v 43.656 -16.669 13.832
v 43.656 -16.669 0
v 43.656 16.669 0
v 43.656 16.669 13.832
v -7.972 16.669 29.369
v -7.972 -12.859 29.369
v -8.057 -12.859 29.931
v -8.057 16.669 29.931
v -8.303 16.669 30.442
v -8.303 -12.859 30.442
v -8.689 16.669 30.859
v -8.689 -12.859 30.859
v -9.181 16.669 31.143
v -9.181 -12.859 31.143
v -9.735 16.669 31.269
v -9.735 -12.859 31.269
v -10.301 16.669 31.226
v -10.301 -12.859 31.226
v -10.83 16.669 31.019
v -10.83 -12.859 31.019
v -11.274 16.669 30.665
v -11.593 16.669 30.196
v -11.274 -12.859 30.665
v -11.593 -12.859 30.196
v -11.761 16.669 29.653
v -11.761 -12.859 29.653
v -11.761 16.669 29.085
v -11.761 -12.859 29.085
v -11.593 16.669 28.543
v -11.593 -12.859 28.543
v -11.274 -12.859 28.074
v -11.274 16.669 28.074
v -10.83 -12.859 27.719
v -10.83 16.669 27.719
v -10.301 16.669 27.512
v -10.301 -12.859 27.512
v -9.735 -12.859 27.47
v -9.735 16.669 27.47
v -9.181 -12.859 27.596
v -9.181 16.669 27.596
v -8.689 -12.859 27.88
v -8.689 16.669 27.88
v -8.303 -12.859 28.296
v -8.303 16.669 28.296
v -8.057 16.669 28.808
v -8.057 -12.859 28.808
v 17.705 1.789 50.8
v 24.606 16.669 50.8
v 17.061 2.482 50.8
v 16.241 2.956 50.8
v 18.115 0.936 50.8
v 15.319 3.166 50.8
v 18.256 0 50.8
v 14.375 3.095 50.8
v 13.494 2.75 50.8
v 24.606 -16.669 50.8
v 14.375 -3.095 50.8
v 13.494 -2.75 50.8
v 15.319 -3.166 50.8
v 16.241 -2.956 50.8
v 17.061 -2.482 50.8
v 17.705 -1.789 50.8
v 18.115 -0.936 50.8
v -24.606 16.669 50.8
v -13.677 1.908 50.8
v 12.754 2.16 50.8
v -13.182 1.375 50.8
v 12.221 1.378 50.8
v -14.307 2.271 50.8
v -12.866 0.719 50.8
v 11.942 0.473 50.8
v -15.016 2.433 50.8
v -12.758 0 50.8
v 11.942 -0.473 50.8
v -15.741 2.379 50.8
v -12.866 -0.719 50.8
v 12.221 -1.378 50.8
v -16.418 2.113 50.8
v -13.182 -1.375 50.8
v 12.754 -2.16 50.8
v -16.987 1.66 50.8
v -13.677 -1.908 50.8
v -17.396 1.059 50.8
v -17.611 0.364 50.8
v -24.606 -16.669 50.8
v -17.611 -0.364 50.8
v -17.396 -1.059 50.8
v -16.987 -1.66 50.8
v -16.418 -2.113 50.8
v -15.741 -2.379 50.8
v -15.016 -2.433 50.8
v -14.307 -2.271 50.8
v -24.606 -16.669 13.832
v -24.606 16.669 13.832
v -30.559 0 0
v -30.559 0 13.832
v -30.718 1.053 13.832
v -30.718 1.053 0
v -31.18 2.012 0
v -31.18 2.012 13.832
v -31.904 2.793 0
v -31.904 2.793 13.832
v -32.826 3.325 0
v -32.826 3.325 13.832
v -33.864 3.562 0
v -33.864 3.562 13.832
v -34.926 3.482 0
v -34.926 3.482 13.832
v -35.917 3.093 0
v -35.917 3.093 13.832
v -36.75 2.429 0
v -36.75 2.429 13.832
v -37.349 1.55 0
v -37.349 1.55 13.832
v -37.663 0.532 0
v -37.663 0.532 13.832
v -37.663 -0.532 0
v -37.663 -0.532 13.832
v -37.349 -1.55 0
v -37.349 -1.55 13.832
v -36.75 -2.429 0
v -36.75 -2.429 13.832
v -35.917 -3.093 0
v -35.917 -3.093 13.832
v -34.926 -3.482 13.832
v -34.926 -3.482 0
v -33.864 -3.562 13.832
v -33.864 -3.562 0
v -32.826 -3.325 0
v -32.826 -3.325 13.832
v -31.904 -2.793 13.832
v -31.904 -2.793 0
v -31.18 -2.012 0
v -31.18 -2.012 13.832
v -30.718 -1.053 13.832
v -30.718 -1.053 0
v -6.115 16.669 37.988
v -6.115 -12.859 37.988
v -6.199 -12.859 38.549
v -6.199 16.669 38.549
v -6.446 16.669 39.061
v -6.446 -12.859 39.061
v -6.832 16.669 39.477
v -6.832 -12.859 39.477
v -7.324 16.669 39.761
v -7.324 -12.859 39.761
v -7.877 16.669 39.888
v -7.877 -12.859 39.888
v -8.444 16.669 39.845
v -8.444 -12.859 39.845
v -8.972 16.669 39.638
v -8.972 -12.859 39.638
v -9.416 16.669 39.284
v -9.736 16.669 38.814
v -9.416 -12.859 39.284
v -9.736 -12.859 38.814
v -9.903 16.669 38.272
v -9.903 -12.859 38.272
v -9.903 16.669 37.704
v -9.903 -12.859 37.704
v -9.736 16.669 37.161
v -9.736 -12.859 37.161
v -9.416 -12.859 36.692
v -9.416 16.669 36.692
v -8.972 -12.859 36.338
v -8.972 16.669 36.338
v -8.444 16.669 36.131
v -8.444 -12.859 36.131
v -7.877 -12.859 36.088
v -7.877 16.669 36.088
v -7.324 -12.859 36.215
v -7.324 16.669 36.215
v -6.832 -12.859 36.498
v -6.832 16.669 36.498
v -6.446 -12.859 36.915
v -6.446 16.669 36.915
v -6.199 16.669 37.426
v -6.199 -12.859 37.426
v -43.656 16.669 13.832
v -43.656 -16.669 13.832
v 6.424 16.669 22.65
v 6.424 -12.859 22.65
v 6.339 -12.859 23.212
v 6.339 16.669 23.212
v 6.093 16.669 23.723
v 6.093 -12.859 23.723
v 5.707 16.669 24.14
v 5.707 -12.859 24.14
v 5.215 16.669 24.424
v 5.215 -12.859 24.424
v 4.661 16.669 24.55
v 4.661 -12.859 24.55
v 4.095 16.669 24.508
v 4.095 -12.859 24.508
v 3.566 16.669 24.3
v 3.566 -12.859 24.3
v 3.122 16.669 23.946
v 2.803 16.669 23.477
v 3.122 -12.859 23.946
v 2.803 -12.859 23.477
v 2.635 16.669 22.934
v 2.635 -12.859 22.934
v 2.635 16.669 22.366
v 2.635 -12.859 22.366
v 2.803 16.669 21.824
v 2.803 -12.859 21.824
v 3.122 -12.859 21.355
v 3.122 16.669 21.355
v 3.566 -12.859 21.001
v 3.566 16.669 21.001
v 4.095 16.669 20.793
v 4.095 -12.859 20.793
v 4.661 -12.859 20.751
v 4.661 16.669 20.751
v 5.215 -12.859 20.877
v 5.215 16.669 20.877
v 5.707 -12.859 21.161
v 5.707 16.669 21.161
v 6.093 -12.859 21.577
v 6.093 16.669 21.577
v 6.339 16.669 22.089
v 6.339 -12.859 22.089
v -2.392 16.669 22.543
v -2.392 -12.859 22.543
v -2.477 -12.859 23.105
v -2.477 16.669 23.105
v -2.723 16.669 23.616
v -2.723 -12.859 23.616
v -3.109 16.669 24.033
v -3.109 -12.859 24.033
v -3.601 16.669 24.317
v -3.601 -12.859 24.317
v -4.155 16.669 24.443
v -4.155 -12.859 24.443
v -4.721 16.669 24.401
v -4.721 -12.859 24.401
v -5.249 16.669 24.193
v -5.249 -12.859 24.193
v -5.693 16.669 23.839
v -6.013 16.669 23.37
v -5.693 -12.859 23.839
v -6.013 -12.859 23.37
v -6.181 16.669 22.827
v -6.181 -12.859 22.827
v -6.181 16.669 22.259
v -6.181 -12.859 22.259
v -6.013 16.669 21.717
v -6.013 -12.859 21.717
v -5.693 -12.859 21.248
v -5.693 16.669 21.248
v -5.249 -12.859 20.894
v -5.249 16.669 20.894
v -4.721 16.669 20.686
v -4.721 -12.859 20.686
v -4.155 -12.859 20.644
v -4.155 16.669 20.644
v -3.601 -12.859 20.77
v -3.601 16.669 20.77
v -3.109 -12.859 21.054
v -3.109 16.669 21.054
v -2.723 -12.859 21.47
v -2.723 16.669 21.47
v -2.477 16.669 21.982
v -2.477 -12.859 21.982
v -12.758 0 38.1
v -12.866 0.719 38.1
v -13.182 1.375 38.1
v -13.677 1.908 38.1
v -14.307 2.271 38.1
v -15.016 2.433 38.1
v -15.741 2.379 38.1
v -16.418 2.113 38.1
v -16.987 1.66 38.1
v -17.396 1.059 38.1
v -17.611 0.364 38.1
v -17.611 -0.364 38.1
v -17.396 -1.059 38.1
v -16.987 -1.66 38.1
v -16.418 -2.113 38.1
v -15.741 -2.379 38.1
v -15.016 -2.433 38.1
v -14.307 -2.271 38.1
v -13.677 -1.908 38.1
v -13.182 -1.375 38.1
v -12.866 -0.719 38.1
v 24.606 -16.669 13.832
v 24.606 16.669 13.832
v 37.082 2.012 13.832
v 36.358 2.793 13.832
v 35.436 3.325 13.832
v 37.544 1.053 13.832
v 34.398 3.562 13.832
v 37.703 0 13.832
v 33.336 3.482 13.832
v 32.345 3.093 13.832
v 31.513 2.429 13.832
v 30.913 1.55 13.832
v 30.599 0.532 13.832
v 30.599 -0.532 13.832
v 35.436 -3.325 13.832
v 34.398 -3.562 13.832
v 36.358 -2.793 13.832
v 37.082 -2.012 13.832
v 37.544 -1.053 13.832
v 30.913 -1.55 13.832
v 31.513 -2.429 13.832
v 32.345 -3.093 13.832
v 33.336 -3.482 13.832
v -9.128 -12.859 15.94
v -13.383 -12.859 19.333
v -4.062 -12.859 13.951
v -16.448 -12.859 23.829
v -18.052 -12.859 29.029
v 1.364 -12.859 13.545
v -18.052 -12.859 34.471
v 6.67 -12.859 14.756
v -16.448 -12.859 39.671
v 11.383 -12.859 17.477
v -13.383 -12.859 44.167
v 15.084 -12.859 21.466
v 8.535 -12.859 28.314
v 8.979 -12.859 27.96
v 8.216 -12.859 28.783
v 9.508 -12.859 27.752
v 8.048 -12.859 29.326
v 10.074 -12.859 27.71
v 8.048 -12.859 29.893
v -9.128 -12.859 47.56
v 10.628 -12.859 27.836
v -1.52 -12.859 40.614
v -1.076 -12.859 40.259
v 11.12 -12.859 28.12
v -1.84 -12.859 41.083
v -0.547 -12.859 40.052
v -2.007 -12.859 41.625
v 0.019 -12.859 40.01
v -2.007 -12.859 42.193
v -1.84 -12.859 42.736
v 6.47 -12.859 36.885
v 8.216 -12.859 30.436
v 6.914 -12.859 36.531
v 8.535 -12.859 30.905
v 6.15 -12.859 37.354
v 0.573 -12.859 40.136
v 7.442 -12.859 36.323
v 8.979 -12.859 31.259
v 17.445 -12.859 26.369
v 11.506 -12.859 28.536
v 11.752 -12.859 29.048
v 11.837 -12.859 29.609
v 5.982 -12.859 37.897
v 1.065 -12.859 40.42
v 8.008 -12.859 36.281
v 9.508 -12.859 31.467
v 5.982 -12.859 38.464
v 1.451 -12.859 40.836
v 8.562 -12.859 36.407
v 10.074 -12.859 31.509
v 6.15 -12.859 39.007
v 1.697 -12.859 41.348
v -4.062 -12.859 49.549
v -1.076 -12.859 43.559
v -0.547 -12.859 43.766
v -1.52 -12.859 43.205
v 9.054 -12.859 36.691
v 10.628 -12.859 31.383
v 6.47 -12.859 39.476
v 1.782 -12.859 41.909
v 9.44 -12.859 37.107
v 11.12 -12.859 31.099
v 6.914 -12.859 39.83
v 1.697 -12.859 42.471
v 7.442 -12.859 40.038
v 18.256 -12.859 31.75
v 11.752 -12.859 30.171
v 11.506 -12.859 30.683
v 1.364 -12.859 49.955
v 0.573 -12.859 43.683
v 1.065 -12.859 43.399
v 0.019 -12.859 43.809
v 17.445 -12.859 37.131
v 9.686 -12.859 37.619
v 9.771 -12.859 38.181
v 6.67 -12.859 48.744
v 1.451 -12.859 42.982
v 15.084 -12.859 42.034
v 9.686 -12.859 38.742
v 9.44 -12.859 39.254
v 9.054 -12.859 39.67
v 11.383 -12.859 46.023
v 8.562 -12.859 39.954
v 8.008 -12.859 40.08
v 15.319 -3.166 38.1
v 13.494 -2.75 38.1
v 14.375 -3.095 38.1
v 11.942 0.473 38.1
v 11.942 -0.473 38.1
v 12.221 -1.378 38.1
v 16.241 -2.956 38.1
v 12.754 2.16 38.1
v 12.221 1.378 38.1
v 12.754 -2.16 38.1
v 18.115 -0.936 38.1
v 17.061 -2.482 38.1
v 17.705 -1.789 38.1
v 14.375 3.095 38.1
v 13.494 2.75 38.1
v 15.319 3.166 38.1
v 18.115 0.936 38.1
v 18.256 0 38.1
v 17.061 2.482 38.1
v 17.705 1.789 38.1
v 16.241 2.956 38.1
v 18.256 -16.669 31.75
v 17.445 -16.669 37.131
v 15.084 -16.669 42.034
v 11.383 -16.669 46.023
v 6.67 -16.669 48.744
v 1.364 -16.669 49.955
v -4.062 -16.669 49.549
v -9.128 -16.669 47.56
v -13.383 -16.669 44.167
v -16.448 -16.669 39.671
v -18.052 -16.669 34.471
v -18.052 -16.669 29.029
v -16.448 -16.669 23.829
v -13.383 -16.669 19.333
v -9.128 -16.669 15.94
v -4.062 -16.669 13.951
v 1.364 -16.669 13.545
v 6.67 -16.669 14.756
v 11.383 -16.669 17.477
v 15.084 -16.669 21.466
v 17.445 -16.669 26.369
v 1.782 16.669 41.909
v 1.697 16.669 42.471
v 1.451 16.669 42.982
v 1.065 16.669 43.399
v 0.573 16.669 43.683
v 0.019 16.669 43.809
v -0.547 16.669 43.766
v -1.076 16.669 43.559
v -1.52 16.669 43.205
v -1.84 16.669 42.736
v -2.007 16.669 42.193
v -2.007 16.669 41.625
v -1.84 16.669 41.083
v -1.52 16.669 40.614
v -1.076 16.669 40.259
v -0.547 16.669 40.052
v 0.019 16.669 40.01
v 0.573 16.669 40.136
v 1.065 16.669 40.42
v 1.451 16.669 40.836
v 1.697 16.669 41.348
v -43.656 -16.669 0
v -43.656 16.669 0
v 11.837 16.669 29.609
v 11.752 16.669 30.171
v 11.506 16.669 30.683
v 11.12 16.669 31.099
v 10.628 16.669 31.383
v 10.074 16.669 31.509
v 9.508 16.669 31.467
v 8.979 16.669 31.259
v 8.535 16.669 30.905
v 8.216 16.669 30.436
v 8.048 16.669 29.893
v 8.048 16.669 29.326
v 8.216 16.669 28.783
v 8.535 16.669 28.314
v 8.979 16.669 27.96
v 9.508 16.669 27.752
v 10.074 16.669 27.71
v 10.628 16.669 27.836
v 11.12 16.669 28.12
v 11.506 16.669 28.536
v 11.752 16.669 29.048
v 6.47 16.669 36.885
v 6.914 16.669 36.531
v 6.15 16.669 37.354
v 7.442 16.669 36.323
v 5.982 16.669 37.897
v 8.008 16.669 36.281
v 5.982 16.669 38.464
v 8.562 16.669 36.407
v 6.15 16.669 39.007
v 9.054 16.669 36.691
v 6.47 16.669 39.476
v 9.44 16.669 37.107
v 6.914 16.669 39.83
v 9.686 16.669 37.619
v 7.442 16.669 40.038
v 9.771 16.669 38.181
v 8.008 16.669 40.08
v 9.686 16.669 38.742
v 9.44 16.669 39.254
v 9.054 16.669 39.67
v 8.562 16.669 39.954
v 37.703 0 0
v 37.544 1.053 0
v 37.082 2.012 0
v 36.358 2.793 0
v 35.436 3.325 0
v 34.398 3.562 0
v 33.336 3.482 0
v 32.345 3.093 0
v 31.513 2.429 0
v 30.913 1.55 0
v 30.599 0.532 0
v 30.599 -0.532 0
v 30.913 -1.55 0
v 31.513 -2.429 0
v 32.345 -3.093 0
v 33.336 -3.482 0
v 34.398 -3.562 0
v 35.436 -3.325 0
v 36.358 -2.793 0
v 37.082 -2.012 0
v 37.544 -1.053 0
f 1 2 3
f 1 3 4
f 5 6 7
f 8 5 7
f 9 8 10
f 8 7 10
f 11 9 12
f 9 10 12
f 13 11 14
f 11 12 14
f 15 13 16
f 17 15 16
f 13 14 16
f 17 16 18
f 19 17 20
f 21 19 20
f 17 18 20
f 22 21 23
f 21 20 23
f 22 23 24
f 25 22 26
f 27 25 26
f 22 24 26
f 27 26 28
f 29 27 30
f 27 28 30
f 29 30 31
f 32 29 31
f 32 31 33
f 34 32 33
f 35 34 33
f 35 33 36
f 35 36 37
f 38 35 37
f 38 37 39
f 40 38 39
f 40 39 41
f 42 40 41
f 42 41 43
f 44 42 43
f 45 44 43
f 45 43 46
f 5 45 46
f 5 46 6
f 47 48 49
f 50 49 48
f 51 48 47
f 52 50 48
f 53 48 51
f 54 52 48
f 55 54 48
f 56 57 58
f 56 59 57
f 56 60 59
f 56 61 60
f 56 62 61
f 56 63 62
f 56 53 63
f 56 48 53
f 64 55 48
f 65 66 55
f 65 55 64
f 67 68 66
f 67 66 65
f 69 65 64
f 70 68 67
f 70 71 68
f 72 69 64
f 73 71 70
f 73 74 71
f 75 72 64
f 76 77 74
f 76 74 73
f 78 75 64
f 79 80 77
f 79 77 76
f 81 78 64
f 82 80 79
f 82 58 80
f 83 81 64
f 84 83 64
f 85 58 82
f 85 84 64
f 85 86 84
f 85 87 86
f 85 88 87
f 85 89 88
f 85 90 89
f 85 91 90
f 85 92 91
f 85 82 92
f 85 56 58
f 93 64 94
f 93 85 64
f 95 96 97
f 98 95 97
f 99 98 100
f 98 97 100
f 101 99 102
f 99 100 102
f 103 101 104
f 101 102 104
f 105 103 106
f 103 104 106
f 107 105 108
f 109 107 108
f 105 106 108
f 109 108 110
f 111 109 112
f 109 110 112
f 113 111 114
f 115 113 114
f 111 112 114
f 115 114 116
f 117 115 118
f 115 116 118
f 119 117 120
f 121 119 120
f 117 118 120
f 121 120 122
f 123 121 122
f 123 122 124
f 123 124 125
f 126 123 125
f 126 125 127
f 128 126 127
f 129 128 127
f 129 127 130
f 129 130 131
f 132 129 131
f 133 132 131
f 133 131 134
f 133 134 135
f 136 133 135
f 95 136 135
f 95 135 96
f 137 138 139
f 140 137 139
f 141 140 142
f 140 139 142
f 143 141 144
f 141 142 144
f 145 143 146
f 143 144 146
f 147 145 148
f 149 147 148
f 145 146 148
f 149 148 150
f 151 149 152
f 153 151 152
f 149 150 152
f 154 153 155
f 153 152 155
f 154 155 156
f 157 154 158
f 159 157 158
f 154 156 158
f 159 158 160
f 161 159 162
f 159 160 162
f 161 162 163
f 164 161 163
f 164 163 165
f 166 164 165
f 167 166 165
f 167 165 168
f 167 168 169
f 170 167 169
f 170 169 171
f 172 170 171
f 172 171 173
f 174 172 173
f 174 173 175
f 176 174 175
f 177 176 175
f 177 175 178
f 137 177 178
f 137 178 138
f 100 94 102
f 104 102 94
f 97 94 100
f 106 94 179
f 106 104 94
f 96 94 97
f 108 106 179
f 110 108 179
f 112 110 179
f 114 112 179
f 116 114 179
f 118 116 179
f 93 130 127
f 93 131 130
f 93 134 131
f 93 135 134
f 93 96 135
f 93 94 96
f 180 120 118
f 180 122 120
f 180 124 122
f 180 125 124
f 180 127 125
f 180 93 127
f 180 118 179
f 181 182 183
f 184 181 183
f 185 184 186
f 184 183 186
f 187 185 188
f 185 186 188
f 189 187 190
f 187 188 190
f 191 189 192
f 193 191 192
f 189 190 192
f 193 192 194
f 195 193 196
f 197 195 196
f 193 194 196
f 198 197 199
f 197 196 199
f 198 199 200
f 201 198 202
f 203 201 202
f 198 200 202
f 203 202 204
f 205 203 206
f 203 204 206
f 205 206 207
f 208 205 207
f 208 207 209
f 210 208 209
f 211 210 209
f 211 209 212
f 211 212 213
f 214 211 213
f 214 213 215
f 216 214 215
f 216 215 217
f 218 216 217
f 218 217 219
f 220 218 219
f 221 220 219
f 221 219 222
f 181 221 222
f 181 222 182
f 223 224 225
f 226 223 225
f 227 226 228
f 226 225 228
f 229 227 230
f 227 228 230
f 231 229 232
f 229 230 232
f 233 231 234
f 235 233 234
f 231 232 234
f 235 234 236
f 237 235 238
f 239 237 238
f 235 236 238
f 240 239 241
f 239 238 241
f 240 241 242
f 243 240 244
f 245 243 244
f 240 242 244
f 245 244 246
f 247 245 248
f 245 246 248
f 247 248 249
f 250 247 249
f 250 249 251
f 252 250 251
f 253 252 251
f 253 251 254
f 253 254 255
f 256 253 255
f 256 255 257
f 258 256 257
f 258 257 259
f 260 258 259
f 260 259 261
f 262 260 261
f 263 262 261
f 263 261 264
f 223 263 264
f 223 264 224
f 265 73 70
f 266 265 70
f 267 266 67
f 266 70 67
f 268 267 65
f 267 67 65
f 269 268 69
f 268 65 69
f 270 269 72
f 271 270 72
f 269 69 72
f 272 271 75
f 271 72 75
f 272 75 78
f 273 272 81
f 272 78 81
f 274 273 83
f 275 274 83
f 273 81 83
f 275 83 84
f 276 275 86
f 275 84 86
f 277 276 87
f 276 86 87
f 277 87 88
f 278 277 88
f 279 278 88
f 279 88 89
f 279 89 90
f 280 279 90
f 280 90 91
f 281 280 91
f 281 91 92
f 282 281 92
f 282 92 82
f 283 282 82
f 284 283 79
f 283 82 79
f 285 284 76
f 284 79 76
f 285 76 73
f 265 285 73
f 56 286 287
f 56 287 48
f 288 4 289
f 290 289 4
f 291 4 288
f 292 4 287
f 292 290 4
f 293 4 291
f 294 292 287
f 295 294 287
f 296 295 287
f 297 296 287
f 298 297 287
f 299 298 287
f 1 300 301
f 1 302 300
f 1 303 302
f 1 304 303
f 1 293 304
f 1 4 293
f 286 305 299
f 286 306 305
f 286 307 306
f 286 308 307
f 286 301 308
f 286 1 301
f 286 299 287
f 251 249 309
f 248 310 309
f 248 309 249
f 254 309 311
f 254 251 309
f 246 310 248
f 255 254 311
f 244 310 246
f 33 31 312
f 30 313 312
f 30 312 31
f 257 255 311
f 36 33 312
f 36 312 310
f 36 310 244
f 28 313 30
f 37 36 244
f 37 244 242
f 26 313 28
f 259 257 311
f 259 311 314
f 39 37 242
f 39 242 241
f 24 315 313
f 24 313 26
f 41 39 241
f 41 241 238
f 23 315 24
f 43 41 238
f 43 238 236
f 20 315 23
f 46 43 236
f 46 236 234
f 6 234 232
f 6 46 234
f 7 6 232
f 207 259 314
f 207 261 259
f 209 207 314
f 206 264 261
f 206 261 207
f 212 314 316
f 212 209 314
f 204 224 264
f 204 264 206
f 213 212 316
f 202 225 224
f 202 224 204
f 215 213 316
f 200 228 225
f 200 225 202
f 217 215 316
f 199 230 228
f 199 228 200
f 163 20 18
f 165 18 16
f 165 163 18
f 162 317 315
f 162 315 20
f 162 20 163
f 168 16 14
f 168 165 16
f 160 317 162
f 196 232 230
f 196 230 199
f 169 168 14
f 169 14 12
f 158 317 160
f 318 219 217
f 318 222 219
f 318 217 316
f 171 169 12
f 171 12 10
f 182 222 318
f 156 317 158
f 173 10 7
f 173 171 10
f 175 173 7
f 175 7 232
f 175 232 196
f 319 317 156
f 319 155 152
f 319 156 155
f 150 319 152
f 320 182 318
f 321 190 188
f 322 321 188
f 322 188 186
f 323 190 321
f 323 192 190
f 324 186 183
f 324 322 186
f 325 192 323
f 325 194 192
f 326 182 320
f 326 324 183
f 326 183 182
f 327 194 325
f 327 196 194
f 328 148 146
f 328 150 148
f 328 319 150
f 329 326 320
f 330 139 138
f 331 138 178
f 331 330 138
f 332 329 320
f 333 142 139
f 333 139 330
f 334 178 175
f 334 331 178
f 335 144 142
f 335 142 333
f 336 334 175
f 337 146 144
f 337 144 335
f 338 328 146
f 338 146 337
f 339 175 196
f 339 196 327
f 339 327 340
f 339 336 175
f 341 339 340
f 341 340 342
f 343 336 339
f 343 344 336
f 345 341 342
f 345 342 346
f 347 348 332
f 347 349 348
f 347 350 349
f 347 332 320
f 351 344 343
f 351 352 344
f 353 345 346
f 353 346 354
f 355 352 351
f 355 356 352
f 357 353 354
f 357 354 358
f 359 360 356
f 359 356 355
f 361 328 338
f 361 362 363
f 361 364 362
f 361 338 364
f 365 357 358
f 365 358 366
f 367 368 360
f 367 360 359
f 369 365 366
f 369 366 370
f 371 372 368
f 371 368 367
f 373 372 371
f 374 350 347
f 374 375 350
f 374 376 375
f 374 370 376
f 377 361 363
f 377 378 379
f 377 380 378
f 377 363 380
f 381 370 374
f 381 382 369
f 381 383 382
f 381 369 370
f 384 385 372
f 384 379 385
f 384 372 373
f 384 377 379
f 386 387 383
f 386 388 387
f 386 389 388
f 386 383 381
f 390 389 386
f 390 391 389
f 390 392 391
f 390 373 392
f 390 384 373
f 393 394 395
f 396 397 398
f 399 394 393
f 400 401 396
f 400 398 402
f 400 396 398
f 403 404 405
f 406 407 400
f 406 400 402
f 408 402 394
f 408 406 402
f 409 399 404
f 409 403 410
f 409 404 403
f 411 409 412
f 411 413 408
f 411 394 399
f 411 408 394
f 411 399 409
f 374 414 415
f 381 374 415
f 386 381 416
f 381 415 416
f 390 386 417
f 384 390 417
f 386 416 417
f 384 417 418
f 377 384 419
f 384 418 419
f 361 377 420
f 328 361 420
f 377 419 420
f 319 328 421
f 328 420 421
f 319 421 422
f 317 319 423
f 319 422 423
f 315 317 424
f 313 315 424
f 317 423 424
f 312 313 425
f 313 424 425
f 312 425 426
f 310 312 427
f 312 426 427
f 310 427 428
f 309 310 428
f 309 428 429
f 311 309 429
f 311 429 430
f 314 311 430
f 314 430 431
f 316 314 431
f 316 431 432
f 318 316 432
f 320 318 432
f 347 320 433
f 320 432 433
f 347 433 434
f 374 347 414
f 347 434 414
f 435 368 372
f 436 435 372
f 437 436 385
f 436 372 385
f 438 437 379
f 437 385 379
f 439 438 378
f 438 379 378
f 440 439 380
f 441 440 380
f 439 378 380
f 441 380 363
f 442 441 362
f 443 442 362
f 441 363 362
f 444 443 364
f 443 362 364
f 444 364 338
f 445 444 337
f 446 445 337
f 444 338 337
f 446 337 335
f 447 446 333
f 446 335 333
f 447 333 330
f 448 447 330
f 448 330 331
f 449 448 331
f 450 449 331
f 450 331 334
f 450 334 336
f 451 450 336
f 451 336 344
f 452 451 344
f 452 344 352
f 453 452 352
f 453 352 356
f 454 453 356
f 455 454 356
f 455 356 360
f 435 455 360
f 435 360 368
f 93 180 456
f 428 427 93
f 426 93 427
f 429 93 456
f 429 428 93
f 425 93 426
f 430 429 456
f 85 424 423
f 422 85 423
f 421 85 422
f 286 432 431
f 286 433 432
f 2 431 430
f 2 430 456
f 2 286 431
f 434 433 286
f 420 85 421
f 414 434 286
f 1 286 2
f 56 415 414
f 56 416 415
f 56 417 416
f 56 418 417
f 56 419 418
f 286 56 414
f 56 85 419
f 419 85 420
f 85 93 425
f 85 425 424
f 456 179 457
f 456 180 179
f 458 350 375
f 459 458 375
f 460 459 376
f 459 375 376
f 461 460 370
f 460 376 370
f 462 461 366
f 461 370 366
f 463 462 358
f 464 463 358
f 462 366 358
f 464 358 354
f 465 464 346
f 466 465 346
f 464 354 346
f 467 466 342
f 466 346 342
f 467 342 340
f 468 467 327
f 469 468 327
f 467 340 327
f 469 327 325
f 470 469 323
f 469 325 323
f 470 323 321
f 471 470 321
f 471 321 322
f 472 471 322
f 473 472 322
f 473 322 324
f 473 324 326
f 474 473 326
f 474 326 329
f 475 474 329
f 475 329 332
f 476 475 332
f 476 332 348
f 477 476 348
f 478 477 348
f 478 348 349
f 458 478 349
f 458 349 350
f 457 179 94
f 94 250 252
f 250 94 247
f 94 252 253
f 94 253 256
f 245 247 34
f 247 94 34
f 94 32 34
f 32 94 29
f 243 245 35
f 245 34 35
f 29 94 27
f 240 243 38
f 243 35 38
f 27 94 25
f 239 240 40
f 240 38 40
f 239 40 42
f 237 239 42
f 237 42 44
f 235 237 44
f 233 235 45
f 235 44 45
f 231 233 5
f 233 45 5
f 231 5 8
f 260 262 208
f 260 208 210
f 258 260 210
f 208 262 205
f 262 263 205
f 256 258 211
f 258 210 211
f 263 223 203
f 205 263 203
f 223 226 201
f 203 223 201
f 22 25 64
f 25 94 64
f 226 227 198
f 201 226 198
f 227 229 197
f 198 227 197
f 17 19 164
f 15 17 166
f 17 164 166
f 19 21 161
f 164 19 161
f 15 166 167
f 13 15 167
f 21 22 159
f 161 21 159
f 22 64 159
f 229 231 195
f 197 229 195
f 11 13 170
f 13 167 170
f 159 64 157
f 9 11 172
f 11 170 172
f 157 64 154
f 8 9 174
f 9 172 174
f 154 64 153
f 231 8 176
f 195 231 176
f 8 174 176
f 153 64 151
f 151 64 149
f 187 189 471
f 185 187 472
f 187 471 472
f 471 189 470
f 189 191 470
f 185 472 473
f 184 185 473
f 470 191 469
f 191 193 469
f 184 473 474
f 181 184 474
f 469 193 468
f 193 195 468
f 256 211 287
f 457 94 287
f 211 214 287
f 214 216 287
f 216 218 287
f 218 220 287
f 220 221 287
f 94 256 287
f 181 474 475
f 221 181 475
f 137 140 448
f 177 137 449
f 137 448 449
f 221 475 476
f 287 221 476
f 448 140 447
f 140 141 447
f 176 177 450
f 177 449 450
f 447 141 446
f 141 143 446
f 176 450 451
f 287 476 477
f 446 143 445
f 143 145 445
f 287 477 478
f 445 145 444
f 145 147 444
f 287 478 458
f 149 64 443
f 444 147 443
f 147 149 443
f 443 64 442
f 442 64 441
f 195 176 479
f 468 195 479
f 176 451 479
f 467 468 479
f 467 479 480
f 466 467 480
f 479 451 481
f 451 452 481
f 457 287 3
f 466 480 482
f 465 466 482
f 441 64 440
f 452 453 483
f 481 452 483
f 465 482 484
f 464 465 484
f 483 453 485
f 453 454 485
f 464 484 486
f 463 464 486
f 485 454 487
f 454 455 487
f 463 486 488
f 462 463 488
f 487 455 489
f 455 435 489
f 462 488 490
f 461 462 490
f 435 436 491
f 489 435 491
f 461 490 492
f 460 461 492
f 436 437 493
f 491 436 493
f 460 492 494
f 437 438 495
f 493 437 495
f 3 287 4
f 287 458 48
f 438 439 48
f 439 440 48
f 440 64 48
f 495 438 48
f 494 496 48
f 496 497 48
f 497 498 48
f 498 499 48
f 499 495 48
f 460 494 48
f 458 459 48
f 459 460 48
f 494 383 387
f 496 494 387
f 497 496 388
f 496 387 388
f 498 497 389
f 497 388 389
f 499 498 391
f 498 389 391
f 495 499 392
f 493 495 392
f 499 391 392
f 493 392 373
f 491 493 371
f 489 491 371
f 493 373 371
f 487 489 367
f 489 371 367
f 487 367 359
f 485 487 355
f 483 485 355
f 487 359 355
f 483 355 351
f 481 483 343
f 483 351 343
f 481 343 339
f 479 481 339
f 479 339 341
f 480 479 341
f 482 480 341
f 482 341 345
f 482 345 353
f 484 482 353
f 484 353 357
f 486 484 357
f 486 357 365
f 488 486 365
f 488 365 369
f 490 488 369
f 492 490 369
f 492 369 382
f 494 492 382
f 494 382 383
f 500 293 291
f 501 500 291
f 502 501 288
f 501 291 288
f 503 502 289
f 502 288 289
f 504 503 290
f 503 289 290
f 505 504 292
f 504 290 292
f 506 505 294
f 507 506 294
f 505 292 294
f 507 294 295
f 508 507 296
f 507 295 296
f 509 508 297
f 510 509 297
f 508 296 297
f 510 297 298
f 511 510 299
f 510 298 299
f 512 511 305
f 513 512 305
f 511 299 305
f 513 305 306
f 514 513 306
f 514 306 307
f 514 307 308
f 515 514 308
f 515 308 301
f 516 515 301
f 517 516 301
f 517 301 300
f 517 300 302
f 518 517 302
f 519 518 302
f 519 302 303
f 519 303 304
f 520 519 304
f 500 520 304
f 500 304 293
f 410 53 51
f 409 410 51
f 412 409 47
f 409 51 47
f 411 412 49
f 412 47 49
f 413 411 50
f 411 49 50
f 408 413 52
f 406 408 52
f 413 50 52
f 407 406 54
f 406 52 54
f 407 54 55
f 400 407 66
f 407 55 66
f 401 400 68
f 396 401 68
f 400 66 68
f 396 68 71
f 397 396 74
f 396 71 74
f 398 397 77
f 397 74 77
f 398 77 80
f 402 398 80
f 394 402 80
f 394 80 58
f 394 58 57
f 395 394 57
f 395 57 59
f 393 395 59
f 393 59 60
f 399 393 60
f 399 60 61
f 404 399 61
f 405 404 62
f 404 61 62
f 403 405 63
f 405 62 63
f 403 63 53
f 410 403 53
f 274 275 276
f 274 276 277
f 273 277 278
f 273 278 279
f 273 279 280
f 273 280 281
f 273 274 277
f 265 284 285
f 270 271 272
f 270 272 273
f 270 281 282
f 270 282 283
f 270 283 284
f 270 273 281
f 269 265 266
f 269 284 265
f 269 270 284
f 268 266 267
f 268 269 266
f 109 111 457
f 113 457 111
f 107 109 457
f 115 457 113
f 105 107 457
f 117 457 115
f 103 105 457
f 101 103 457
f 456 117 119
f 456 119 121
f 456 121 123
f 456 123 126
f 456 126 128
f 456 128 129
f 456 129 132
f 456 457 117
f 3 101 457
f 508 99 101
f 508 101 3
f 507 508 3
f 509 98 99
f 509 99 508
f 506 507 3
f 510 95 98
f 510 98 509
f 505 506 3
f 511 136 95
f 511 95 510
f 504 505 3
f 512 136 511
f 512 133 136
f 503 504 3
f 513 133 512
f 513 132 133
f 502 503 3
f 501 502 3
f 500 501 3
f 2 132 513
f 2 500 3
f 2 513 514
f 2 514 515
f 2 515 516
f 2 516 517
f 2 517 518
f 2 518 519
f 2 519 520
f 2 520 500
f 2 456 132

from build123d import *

# Parameters (mm, degrees)
F1_DEPTH = 16.66875
F2_R     = 3.571875
F3_DEPTH = 13.833281
F4_R     = 3.175
F4_R_2   = 2.440092
F5_DEPTH = 12.7
F6_R     = 18.25625
F7_DEPTH = 3.81
F8_R     = 1.905
F9_DEPTH = 29.5285


with BuildPart() as f1:
    # F0 (on Front) → F1 (new body, symmetric)
    with BuildSketch(Plane.XZ):
        Polygon((-43.65625, 13.832281), (-43.65625, 0), (43.65625, 0), (43.65625, 13.832281), (24.60625, 13.832281), (24.60625, 50.8), (0, 50.8), (-24.60625, 50.8), (-24.60625, 13.832281), align=None)
    extrude(amount=F1_DEPTH, both=True)

    # F2 (on face) → F3 (cut, through all)
    with BuildSketch(Plane.XY.offset(13.832281)):
        with Locations((-34.13125, 0)):
            Circle(F2_R)
        with Locations((34.13125, 0)):
            Circle(F2_R)
    extrude(amount=-F3_DEPTH, mode=Mode.SUBTRACT)

    # F4 (on face) → F5 (cut)
    with BuildSketch(Plane.XY.offset(50.8)):
        with Locations((15.08125, 0)):
            Circle(F4_R)
        with Locations((-15.197981, 0)):
            Circle(F4_R_2)
    extrude(amount=-F5_DEPTH, mode=Mode.SUBTRACT)

    # F6 (on face) → F7 (cut)
    with BuildSketch(Plane.XZ.offset(16.66875)):
        with Locations((0, 31.75)):
            Circle(F6_R)
    extrude(amount=-F7_DEPTH, mode=Mode.SUBTRACT)

    # F8 (on face) → F9 (cut, through all)
    with BuildSketch(Plane.XZ.offset(12.85875)):
        with Locations((-8.019643, 37.987862)):
            Circle(F8_R)
        with Locations((-0.123209, 41.909253)):
            Circle(F8_R)
        with Locations((7.866004, 38.180519)):
            Circle(F8_R)
        with Locations((9.931956, 29.609473)):
            Circle(F8_R)
        with Locations((4.518942, 22.650288)):
            Circle(F8_R)
        with Locations((-4.296927, 22.543371)):
            Circle(F8_R)
        with Locations((-9.877123, 29.369234)):
            Circle(F8_R)
    extrude(amount=-F9_DEPTH, mode=Mode.SUBTRACT)


solid = f1.part
